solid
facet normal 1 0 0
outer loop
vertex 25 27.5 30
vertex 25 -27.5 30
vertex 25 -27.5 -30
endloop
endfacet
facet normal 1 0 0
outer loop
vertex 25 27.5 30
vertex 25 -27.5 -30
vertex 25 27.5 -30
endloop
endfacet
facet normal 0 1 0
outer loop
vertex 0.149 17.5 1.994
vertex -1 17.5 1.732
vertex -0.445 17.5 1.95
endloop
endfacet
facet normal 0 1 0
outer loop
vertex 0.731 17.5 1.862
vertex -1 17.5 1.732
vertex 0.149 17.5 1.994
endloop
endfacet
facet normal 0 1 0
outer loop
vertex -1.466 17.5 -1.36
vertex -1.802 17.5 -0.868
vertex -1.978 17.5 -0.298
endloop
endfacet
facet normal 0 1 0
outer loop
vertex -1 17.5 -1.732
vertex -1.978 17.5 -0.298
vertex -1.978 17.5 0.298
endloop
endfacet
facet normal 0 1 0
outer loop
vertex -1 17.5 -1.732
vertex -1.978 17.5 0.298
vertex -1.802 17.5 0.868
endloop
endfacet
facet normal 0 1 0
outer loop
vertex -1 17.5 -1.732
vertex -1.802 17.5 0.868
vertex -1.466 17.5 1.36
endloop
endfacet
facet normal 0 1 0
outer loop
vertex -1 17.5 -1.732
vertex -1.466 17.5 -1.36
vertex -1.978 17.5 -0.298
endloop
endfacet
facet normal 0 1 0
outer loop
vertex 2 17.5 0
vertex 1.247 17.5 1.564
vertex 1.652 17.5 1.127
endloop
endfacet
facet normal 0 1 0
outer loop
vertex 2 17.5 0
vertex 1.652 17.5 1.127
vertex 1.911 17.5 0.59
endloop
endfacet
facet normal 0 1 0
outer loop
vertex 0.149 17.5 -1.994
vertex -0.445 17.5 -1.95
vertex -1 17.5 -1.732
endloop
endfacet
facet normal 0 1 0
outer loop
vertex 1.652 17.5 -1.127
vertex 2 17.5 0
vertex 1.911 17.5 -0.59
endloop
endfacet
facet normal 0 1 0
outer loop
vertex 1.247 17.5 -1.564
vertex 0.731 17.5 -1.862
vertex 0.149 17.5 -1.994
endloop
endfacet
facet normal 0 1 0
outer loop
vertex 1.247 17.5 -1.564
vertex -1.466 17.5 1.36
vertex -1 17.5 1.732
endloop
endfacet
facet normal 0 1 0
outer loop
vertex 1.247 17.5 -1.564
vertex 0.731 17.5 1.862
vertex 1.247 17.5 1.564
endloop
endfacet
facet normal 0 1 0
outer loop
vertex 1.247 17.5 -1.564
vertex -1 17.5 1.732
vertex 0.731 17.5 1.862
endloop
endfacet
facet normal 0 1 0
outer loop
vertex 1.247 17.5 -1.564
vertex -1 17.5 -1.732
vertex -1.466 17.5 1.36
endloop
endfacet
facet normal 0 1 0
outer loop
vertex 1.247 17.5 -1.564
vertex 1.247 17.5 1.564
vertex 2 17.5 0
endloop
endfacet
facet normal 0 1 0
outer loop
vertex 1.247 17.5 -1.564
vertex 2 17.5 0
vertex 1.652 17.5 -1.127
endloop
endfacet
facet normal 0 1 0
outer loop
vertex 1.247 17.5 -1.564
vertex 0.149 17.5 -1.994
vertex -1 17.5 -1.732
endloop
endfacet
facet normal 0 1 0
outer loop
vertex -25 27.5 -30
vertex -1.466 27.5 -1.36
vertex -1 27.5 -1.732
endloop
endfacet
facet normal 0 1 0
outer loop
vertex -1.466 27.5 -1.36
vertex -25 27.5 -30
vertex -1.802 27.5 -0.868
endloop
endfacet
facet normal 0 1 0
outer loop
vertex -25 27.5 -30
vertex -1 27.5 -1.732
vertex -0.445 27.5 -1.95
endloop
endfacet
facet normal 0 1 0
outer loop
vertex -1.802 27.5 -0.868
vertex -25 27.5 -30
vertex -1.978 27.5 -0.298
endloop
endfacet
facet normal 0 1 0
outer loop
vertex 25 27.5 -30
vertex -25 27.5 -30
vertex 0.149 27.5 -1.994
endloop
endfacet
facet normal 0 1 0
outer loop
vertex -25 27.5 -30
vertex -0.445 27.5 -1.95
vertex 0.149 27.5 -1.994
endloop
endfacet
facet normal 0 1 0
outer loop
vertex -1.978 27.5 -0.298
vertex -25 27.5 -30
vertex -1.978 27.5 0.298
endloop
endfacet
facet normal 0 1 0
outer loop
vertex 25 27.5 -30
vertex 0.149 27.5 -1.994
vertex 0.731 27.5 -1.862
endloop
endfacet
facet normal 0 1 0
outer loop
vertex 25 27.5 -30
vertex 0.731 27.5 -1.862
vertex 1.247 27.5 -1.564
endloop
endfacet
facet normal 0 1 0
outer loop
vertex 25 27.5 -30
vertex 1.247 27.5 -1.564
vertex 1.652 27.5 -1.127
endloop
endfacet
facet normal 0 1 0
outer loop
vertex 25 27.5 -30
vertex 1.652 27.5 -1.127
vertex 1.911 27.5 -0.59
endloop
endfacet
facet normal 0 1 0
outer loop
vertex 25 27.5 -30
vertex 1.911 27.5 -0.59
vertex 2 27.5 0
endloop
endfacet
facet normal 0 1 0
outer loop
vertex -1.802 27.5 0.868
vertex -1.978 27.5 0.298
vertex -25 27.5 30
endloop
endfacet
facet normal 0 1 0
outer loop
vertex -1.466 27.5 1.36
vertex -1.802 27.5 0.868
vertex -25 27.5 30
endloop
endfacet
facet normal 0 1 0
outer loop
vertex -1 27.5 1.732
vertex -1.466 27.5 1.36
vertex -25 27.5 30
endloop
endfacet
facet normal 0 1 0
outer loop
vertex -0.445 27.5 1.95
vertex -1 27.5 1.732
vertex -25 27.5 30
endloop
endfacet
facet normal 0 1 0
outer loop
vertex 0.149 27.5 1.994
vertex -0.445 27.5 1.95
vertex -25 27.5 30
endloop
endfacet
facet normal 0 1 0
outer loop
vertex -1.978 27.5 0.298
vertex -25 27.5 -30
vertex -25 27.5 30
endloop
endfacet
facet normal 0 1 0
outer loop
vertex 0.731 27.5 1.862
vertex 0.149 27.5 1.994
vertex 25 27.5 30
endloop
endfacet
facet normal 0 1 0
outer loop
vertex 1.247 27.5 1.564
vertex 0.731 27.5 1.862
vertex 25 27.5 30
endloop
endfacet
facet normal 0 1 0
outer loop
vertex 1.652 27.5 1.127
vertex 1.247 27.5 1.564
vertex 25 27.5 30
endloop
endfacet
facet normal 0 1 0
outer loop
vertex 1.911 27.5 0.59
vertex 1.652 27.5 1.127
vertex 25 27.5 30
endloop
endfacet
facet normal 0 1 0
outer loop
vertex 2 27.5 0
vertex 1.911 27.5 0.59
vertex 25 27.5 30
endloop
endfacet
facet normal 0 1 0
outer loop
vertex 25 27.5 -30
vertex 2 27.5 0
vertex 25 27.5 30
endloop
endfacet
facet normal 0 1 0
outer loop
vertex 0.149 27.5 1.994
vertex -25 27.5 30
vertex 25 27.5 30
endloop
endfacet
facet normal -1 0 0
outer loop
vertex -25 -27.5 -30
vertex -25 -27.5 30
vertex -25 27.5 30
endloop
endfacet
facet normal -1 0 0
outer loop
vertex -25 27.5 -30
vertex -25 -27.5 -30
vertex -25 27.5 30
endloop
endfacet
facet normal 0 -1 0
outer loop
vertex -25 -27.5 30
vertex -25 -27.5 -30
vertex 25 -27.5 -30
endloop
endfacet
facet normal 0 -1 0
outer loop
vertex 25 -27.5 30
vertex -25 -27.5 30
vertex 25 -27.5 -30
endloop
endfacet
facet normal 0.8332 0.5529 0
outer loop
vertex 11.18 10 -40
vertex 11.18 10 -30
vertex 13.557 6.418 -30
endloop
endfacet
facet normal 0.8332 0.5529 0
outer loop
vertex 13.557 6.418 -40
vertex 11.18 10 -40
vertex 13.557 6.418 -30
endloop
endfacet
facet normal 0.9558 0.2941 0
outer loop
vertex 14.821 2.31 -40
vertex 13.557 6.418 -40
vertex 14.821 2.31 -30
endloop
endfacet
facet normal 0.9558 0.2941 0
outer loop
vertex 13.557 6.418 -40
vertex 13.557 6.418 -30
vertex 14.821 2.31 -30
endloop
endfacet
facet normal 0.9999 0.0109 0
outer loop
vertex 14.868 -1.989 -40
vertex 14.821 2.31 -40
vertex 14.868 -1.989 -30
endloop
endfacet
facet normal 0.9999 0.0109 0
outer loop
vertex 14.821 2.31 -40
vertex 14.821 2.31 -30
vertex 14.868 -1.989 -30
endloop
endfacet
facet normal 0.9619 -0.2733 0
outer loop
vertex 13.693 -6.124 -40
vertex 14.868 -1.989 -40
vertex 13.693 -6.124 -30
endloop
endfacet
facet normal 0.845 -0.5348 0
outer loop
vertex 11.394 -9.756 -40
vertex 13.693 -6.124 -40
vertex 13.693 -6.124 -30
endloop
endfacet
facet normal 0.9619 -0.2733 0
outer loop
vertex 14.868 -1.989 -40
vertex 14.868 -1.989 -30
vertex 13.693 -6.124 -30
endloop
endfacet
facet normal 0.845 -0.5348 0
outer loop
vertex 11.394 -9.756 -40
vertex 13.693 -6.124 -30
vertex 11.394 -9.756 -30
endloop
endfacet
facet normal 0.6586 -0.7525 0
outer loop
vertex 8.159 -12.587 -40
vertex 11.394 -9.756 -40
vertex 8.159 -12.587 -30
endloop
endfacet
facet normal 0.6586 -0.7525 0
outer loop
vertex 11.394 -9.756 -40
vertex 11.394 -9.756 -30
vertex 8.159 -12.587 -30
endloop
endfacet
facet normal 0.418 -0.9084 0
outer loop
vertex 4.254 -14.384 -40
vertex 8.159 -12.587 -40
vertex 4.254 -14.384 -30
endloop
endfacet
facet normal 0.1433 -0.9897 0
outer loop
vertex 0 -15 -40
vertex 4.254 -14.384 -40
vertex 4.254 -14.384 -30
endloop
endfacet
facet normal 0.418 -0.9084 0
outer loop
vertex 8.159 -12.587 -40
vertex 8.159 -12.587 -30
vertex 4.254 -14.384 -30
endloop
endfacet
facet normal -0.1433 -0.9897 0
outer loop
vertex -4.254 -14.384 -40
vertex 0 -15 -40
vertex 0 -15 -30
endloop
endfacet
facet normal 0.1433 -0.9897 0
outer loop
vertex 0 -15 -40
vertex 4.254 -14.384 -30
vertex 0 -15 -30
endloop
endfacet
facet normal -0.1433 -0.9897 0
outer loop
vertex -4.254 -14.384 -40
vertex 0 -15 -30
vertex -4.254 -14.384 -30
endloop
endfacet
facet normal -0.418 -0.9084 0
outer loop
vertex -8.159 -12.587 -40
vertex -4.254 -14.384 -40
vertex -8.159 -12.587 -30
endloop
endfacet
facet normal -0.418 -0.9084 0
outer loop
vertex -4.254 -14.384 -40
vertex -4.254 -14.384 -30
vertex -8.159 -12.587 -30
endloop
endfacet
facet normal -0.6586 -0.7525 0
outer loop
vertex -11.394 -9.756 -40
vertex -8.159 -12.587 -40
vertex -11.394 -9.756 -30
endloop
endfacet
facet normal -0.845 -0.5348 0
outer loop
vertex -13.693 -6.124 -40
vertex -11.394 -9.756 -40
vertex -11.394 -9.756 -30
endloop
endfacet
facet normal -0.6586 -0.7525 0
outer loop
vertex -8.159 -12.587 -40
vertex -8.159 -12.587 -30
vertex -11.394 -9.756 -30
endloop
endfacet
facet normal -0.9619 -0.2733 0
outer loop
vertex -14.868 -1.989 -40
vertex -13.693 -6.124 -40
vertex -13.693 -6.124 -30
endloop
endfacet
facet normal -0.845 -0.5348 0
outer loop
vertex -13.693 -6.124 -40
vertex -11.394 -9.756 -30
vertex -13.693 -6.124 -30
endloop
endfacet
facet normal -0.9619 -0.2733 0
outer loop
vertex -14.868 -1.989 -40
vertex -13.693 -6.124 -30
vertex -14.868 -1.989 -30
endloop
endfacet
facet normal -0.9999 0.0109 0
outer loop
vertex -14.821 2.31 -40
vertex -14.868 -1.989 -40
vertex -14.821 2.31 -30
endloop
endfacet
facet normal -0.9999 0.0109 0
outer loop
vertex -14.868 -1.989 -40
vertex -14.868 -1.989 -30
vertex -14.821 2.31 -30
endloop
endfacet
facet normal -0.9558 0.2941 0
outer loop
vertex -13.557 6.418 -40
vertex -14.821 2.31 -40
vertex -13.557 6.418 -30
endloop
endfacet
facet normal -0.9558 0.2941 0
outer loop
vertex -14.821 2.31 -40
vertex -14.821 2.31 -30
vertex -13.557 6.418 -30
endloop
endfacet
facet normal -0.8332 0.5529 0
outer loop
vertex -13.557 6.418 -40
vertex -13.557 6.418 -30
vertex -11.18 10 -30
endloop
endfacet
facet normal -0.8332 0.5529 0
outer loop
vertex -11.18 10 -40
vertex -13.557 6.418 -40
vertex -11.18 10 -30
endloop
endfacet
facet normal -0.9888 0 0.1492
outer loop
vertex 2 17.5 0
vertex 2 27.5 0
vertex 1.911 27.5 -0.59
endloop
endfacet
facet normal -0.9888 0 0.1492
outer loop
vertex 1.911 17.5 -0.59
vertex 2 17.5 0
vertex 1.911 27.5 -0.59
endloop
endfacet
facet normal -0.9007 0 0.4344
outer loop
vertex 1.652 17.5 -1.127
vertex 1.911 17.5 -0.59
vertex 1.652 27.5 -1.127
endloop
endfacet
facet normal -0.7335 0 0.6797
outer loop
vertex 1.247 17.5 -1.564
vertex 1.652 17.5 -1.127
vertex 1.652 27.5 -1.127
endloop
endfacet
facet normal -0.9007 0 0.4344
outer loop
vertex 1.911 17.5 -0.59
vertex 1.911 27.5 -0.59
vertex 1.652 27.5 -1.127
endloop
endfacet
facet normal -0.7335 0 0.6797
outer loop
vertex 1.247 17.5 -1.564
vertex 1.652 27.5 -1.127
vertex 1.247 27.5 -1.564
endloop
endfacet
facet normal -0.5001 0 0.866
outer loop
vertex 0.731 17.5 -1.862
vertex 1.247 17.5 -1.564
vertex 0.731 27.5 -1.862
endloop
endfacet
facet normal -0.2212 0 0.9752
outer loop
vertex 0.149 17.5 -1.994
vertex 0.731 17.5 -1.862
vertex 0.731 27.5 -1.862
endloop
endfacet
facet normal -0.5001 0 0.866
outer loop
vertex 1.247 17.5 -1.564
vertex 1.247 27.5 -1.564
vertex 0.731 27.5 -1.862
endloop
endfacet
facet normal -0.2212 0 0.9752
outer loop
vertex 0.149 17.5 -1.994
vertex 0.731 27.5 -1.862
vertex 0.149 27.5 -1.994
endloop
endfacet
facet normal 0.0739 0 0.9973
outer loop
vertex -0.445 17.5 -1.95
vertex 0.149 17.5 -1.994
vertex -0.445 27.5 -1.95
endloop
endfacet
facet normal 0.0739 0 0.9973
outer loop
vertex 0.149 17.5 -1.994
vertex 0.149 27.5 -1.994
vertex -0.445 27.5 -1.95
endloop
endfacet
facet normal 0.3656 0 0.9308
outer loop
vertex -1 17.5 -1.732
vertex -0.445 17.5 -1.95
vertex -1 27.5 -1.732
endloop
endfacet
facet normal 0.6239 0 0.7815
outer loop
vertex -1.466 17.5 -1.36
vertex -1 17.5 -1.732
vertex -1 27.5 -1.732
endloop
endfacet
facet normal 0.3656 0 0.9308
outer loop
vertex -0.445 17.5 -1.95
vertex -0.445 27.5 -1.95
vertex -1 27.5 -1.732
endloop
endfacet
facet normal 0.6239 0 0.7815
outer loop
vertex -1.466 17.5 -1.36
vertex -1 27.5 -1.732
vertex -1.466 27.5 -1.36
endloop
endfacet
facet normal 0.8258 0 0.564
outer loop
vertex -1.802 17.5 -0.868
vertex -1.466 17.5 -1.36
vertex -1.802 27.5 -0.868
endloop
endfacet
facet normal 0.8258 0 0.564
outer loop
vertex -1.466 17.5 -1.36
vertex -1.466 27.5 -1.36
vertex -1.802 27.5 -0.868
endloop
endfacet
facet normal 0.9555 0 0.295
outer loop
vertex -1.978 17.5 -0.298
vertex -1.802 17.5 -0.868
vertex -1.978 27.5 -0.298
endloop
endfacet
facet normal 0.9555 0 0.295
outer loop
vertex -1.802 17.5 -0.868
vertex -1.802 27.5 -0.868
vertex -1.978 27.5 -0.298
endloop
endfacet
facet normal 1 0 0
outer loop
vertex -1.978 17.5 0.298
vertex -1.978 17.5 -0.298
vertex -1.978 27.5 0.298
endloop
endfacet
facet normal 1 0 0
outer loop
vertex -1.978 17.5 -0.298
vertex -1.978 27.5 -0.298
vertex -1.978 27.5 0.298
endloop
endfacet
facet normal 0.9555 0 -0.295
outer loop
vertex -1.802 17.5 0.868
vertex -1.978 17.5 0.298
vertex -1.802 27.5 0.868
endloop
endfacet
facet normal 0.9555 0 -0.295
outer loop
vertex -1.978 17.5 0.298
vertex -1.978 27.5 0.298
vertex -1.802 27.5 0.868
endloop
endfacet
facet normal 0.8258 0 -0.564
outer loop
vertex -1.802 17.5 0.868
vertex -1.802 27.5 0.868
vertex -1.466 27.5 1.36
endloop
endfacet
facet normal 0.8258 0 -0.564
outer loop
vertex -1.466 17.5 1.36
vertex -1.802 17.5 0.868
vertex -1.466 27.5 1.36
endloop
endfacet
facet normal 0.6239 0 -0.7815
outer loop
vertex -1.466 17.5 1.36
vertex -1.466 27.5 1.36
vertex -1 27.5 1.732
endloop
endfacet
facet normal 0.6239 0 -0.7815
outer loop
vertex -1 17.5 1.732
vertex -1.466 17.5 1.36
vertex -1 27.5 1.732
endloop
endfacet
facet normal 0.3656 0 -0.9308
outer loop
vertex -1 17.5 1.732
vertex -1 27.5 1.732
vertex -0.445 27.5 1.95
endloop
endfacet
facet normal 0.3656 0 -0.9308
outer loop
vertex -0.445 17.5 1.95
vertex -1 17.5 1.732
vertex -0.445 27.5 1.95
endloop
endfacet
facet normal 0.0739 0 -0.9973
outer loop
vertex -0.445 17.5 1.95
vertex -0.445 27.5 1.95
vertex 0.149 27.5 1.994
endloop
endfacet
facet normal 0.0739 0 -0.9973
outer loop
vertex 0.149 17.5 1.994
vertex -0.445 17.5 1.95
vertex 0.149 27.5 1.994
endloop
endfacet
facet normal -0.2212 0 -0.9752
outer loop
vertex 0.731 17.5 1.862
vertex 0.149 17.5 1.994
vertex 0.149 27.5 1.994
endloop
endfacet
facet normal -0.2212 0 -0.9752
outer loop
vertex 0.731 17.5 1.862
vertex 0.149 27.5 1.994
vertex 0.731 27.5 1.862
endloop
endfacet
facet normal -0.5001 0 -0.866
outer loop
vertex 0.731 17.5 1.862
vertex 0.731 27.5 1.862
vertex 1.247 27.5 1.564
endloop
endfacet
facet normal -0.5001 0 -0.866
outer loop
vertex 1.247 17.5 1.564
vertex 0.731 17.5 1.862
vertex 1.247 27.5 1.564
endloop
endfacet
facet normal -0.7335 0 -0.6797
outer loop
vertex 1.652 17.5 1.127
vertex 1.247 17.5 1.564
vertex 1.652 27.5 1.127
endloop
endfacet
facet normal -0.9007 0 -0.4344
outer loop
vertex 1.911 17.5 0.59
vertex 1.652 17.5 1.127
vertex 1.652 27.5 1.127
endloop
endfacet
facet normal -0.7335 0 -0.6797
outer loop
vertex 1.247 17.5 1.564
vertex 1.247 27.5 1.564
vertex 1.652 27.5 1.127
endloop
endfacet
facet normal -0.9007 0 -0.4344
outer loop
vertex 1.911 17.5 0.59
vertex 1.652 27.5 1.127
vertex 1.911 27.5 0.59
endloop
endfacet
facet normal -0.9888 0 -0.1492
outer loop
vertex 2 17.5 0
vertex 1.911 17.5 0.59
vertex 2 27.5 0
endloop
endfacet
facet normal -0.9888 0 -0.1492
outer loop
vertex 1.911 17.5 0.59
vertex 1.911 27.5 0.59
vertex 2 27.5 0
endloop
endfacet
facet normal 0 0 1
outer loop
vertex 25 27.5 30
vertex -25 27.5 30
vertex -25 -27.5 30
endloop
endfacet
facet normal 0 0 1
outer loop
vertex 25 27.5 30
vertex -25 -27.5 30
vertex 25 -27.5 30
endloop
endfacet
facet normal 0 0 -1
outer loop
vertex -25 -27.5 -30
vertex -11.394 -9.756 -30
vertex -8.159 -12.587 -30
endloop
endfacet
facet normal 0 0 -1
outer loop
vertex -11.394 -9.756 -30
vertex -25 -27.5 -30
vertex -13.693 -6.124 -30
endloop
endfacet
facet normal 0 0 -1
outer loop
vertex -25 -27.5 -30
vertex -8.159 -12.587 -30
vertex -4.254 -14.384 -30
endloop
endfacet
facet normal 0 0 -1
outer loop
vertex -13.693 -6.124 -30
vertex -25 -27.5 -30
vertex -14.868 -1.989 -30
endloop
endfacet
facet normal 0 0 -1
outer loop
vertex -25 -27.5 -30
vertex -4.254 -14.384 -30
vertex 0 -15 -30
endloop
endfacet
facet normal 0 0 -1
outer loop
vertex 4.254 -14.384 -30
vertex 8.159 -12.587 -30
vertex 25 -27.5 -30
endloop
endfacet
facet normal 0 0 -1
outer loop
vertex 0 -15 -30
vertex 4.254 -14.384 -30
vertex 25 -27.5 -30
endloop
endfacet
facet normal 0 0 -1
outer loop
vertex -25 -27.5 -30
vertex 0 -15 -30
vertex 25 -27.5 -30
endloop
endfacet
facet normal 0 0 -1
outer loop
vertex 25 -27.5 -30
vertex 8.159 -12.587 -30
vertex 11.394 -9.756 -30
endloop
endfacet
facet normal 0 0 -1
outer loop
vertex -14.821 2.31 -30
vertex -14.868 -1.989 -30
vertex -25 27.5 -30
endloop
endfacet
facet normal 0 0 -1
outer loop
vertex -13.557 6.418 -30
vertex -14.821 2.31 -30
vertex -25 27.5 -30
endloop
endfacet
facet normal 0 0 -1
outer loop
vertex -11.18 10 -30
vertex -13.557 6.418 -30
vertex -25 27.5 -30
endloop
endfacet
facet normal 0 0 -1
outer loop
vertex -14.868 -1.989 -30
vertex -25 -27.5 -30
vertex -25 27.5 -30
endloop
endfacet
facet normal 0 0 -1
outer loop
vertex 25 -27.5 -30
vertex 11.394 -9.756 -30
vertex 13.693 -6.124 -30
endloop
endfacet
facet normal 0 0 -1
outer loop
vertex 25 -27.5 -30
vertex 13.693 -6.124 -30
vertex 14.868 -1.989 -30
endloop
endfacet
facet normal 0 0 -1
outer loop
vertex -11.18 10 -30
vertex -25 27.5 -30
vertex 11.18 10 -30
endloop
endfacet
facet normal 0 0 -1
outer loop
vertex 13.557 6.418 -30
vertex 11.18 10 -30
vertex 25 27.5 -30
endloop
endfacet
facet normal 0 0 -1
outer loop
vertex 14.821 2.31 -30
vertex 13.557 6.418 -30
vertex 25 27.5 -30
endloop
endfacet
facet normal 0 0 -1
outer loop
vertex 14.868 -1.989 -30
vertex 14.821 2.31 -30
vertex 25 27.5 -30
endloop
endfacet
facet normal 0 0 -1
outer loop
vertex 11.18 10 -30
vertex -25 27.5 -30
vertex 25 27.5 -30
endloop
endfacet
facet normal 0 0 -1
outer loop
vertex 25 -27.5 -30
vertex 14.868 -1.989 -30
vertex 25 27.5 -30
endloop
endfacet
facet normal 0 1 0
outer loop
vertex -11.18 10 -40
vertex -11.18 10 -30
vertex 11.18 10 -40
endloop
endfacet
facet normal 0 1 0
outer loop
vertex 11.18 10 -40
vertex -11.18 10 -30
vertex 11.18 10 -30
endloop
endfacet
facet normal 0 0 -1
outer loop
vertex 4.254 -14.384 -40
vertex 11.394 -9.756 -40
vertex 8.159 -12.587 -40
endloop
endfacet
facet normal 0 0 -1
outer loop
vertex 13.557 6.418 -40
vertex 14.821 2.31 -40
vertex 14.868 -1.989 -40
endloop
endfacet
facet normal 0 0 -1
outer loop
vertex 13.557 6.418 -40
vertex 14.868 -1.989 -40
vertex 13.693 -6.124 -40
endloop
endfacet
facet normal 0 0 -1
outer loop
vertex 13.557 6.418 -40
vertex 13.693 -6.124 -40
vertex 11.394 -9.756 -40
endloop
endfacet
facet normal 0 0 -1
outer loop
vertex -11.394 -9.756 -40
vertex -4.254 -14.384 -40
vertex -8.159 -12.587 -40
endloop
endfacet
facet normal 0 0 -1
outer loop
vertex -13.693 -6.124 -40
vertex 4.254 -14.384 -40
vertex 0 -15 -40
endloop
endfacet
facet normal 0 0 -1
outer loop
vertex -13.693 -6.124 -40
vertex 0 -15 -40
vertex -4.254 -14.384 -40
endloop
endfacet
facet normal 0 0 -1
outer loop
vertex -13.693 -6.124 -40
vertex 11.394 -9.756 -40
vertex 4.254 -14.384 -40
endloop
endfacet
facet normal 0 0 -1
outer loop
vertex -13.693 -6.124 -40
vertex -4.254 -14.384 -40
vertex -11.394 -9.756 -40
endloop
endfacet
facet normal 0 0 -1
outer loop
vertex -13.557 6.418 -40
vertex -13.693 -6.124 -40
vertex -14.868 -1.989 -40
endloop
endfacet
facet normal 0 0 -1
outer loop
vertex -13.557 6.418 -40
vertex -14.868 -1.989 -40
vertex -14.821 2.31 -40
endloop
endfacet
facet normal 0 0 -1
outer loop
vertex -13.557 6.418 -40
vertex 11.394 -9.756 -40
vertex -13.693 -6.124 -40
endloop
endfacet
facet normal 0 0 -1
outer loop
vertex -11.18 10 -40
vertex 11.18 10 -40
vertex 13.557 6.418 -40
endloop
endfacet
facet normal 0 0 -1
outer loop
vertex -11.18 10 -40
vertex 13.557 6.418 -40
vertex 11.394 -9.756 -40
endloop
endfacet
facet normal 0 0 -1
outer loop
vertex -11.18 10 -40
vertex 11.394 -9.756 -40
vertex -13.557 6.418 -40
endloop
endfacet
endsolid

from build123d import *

# Parameters (mm, degrees)
SKETCH_1_W          = 50
SKETCH_1_H          = 55
EXTRUDE_1_DEPTH     = 30
EXTRUDE_2_DEPTH     = 10
SKETCH_3_R          = 2
CUT_EXTRUDE_1_DEPTH = 10


with BuildPart() as part:
    # 草图1 → 凸台-拉伸1 (new body, symmetric)
    with BuildSketch(Plane.XY):
        Rectangle(SKETCH_1_W, SKETCH_1_H)
    extrude(amount=EXTRUDE_1_DEPTH, both=True)

    # 草图2 → 凸台-拉伸2 (add)
    with BuildSketch(Plane(origin=(0, 0, -30), x_dir=(-1, 0, 0), z_dir=(0, 0, -1))):
        with BuildLine():
            Line((11.180339887, 10), (-11.180339887, 10))
            ThreePointArc((-11.180339887, 10), (0, -15), (11.180339887, 10))
        make_face()
    extrude(amount=EXTRUDE_2_DEPTH)

    # 草图3 → 切除-拉伸1 (cut)
    with BuildSketch(Plane(origin=(0, 27.5, 0), x_dir=(1, 0, 0), z_dir=(0, 1, 0))):
        Circle(SKETCH_3_R)
    extrude(amount=-CUT_EXTRUDE_1_DEPTH, mode=Mode.SUBTRACT)


solid = part.part
